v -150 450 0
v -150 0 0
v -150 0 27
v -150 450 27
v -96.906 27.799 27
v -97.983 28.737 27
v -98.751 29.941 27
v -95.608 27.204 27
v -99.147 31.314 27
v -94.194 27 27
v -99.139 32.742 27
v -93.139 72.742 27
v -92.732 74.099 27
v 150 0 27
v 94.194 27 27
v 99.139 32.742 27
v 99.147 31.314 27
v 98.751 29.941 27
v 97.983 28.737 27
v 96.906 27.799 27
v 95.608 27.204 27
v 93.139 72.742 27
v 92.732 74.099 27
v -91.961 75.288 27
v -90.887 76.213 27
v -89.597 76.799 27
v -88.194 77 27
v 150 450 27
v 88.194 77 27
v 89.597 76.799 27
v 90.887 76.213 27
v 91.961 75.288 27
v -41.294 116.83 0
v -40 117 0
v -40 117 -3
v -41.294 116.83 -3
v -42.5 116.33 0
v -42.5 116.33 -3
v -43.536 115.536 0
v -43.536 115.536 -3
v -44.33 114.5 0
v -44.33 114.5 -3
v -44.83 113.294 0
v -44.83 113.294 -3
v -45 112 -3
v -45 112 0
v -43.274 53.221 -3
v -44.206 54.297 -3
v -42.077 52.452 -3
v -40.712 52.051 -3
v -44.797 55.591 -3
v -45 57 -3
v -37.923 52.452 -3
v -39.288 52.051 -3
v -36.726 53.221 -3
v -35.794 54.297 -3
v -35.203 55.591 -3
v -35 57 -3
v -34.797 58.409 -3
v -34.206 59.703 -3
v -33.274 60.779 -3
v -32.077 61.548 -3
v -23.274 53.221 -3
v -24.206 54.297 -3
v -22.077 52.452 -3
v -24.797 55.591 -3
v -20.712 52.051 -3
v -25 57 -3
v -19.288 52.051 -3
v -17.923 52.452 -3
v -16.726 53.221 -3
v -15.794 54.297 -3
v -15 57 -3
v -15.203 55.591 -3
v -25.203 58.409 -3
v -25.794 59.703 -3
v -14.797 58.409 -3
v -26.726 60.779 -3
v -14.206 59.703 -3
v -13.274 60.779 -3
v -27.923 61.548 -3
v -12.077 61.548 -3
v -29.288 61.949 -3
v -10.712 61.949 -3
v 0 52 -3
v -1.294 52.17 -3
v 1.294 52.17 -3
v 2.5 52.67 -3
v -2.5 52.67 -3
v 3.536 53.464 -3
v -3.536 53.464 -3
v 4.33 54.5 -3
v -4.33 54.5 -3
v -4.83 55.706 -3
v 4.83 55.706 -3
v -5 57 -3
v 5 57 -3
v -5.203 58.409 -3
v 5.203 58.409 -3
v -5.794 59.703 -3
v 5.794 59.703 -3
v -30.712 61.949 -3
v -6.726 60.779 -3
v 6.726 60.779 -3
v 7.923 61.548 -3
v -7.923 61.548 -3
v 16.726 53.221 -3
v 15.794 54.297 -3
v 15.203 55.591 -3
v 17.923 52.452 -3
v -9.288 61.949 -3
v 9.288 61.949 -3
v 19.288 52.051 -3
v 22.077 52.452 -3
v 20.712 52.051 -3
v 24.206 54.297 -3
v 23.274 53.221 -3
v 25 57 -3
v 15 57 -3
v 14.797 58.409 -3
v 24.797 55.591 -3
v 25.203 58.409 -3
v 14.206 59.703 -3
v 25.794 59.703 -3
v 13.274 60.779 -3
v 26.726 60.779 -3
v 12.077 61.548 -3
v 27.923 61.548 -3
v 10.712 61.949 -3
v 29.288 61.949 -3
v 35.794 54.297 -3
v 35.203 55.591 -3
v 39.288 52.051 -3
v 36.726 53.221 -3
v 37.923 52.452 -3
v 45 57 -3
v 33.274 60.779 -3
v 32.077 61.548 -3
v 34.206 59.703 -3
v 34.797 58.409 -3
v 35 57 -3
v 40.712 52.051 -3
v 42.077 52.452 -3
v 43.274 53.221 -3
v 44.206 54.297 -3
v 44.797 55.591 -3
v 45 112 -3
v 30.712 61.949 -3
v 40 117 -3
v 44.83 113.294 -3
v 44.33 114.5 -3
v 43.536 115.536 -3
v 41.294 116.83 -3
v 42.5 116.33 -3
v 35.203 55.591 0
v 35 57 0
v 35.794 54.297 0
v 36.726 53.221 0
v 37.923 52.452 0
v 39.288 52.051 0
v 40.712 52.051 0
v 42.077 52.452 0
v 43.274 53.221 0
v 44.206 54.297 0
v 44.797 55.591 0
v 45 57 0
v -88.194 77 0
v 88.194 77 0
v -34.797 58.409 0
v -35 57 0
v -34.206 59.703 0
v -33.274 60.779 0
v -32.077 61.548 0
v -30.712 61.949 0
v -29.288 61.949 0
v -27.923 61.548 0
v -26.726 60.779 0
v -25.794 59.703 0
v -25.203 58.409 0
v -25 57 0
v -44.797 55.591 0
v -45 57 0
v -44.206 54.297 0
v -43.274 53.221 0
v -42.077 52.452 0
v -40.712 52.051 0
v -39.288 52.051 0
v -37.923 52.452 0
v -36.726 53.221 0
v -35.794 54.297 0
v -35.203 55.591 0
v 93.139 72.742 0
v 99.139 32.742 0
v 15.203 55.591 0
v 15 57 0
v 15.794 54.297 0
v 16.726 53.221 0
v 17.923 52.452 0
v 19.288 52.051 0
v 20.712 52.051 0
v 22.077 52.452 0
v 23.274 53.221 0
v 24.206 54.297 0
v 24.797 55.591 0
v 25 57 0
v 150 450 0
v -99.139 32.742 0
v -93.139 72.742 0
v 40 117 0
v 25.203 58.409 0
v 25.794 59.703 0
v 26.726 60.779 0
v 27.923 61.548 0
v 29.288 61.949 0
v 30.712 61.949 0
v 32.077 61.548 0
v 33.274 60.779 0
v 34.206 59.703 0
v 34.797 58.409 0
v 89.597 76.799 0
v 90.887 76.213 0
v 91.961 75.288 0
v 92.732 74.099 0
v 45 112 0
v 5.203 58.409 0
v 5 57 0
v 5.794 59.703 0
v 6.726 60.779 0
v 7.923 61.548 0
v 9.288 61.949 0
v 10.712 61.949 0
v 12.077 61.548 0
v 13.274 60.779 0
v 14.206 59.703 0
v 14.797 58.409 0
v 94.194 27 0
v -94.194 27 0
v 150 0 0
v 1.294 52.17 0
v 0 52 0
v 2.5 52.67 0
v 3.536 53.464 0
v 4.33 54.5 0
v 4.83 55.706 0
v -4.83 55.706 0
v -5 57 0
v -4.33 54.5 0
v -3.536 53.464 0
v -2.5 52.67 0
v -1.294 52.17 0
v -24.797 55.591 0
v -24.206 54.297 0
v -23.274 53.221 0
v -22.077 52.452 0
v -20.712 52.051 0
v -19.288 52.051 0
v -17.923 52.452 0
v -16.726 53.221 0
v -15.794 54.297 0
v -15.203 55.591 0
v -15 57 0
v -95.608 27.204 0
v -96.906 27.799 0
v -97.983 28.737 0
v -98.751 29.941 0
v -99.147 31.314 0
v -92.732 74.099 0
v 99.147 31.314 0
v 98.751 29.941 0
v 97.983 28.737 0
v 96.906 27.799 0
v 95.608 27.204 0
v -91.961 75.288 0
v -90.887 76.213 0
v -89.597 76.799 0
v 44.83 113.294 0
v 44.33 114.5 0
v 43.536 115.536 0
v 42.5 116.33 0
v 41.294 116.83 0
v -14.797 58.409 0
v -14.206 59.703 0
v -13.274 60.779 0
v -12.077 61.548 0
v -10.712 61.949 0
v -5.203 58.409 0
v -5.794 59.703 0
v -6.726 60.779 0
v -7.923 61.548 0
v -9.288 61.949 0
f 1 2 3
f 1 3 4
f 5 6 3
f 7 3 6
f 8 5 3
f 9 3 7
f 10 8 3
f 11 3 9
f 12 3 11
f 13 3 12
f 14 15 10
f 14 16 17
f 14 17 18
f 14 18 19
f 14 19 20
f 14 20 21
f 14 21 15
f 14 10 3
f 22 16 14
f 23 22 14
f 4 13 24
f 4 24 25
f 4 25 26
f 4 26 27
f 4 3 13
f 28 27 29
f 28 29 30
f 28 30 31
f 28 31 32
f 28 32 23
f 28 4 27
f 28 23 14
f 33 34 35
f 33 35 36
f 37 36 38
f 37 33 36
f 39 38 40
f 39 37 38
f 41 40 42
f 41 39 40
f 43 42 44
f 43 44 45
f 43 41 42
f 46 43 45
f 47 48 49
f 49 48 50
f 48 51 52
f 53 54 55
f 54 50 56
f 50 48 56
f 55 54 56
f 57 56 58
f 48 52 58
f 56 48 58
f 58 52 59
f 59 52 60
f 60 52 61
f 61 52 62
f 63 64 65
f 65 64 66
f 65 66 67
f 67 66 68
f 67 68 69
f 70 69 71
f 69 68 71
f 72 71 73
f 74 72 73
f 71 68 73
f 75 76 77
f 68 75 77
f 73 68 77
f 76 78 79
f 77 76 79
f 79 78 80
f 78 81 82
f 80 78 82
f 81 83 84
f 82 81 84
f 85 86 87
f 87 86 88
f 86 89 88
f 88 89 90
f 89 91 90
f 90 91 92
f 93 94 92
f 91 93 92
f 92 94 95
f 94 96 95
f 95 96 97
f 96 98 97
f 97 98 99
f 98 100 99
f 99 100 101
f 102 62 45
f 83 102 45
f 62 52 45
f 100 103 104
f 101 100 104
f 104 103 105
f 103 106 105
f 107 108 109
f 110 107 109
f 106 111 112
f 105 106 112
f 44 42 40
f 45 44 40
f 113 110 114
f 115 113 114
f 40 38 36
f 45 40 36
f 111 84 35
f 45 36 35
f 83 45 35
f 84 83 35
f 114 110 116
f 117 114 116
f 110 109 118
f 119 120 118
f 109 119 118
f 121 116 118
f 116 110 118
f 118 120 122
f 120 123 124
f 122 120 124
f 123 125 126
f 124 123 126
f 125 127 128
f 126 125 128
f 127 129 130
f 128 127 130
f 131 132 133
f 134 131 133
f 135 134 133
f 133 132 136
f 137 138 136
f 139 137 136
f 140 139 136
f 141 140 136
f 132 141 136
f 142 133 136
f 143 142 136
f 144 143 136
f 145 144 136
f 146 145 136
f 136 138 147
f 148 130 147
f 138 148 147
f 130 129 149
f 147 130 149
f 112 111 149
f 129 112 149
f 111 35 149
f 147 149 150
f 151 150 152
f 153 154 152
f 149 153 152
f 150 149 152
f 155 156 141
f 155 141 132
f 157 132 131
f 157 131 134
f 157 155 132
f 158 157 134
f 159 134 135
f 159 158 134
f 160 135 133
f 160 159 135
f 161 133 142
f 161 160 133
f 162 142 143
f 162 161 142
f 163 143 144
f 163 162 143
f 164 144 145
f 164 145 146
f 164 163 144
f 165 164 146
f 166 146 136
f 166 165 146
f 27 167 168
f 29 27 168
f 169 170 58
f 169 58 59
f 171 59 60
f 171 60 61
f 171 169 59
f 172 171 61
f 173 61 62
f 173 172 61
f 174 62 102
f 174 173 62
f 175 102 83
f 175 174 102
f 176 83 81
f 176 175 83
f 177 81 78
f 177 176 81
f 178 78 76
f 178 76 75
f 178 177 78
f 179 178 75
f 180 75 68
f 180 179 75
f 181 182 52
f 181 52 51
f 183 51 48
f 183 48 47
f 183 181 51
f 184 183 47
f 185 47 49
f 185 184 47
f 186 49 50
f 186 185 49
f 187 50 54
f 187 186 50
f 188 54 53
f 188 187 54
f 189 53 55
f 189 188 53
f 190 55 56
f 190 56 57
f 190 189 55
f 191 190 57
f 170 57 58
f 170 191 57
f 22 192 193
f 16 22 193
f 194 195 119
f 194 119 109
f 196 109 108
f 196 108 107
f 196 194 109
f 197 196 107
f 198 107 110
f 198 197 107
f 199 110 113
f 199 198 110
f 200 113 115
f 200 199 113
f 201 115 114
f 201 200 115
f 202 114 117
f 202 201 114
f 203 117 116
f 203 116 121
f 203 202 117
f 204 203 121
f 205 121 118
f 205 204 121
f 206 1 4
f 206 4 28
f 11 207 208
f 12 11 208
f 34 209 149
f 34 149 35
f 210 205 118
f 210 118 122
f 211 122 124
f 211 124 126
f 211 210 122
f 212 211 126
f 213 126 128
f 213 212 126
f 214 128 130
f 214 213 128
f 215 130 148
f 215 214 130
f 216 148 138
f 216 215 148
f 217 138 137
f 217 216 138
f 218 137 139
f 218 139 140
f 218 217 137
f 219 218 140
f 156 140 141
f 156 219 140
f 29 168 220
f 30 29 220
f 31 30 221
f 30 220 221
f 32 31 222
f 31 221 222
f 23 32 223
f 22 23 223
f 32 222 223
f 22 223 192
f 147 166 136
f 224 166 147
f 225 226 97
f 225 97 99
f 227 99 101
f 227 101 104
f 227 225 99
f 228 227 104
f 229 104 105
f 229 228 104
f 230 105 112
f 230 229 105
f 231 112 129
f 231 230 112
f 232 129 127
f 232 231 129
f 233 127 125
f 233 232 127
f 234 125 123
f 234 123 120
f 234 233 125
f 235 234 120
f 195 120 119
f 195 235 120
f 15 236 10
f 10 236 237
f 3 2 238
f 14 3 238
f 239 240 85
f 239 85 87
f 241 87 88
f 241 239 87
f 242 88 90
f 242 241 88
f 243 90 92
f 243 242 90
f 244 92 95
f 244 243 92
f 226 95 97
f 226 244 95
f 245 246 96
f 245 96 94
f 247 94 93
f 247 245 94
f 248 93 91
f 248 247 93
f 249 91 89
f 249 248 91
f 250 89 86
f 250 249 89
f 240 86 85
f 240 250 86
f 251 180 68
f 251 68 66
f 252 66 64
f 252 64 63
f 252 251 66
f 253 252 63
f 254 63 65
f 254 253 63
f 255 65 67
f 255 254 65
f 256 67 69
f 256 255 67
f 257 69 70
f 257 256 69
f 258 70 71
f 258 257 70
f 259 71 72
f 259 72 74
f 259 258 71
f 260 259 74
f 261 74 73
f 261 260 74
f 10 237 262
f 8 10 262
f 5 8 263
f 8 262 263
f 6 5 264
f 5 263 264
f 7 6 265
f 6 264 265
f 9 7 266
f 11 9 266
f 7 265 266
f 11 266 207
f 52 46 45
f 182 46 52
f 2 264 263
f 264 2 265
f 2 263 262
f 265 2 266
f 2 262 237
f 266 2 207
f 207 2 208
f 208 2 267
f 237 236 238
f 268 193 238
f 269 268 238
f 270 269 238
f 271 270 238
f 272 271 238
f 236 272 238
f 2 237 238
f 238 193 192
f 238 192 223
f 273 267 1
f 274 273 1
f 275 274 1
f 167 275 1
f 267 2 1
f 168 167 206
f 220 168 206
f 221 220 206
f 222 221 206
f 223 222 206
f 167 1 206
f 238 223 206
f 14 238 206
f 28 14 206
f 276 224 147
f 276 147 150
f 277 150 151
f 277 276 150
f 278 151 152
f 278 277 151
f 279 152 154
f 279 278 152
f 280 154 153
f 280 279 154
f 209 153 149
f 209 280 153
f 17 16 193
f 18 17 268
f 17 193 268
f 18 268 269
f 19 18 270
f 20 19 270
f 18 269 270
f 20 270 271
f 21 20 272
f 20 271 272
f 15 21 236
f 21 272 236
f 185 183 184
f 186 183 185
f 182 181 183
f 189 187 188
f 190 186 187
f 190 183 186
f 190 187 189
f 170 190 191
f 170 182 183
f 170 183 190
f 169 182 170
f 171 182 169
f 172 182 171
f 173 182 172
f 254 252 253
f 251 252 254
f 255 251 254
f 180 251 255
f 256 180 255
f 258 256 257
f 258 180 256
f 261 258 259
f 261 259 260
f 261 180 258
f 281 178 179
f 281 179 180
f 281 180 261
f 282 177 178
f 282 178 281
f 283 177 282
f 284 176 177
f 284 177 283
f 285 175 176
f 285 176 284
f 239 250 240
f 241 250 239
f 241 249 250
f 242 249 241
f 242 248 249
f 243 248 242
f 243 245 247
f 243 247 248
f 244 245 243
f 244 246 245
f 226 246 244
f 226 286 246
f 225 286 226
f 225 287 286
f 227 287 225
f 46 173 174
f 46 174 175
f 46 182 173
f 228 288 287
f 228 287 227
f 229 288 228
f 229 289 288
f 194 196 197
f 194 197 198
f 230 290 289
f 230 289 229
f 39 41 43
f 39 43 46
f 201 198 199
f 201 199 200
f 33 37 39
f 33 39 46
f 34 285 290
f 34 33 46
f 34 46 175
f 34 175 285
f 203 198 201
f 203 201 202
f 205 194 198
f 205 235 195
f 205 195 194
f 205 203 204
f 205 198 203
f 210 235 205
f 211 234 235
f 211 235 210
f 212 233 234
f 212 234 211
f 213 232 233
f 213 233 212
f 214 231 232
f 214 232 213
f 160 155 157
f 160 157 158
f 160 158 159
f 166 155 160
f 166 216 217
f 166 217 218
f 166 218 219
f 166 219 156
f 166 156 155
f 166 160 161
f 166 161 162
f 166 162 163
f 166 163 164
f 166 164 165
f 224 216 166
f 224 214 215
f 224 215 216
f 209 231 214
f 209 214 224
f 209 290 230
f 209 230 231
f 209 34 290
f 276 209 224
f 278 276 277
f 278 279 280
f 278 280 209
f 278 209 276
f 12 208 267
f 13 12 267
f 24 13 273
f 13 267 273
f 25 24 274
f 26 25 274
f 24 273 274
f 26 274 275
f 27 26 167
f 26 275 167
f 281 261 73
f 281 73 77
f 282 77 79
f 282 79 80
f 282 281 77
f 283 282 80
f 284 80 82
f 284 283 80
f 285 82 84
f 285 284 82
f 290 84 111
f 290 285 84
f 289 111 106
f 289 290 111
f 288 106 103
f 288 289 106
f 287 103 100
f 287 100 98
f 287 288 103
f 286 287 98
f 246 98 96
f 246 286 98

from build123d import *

# Parameters (mm, degrees)
F0_W     = 300
F0_H     = 450
F1_DEPTH = 27
F2_DEPTH = 3


with BuildPart() as f1:
    # F0 (on Top) → F1 (new body)
    with BuildSketch(Plane.XY):
        with Locations((0, 225)):
            Rectangle(F0_W, F0_H)
        with BuildLine():
            Line((0, 27), (-94.194062896, 27))
            ThreePointArc((-94.194062896, 27), (-97.982763948, 28.7372183128), (-99.1387446603, 32.7417022647))
            Line((-99.1387446603, 32.7417022647), (-93.1387446603, 72.7417022647))
            ThreePointArc((-93.1387446603, 72.7417022647), (-91.4568445832, 75.788701052), (-88.194062896, 77))
            Line((-88.194062896, 77), (-45, 77))
            Line((-45, 77), (-45, 112))
            ThreePointArc((-45, 112), (-43.5355339059, 115.5355339059), (-40, 117))
            Line((-40, 117), (0, 117))
            Line((0, 117), (40, 117))
            ThreePointArc((40, 117), (43.5355339059, 115.5355339059), (45, 112))
            Line((45, 112), (45, 77))
            Line((45, 77), (88.194062896, 77))
            ThreePointArc((88.194062896, 77), (91.4568445832, 75.788701052), (93.1387446603, 72.7417022647))
            Line((93.1387446603, 72.7417022647), (99.1387446603, 32.7417022647))
            ThreePointArc((99.1387446603, 32.7417022647), (97.982763948, 28.7372183128), (94.194062896, 27))
            Line((94.194062896, 27), (0, 27))
        make_face(mode=Mode.SUBTRACT)
        with BuildLine():
            Line((-45, 112), (-45, 77))
            Line((-45, 77), (0, 77))
            Line((0, 77), (45, 77))
            Line((45, 77), (45, 112))
            ThreePointArc((45, 112), (43.5355339059, 115.5355339059), (40, 117))
            Line((40, 117), (0, 117))
            Line((0, 117), (-40, 117))
            ThreePointArc((-40, 117), (-43.5355339059, 115.5355339059), (-45, 112))
        make_face()
    extrude(amount=F1_DEPTH)


with BuildPart() as f2:
    # F0 (on Top) → F2 (new body)
    with BuildSketch(Plane.XY):
        with BuildLine():
            Line((0, 77), (-45, 77))
            Line((-45, 77), (-45, 57))
            ThreePointArc((-45, 57), (-40, 52), (-35, 57))
            ThreePointArc((-35, 57), (-30, 62), (-25, 57))
            ThreePointArc((-25, 57), (-20, 52), (-15, 57))
            ThreePointArc((-15, 57), (-10, 62), (-5, 57))
            ThreePointArc((-5, 57), (-3.5355339059, 53.4644660941), (0, 52))
            ThreePointArc((0, 52), (3.5355339059, 53.4644660941), (5, 57))
            ThreePointArc((5, 57), (10, 62), (15, 57))
            ThreePointArc((15, 57), (20, 52), (25, 57))
            ThreePointArc((25, 57), (30, 62), (35, 57))
            ThreePointArc((35, 57), (40, 52), (45, 57))
            Line((45, 57), (45, 77))
            Line((45, 77), (0, 77))
        make_face()
        with BuildLine():
            Line((-45, 112), (-45, 77))
            Line((-45, 77), (0, 77))
            Line((0, 77), (45, 77))
            Line((45, 77), (45, 112))
            ThreePointArc((45, 112), (43.5355339059, 115.5355339059), (40, 117))
            Line((40, 117), (0, 117))
            Line((0, 117), (-40, 117))
            ThreePointArc((-40, 117), (-43.5355339059, 115.5355339059), (-45, 112))
        make_face()
    extrude(amount=-F2_DEPTH)


solid = Compound([f1.part, f2.part])
